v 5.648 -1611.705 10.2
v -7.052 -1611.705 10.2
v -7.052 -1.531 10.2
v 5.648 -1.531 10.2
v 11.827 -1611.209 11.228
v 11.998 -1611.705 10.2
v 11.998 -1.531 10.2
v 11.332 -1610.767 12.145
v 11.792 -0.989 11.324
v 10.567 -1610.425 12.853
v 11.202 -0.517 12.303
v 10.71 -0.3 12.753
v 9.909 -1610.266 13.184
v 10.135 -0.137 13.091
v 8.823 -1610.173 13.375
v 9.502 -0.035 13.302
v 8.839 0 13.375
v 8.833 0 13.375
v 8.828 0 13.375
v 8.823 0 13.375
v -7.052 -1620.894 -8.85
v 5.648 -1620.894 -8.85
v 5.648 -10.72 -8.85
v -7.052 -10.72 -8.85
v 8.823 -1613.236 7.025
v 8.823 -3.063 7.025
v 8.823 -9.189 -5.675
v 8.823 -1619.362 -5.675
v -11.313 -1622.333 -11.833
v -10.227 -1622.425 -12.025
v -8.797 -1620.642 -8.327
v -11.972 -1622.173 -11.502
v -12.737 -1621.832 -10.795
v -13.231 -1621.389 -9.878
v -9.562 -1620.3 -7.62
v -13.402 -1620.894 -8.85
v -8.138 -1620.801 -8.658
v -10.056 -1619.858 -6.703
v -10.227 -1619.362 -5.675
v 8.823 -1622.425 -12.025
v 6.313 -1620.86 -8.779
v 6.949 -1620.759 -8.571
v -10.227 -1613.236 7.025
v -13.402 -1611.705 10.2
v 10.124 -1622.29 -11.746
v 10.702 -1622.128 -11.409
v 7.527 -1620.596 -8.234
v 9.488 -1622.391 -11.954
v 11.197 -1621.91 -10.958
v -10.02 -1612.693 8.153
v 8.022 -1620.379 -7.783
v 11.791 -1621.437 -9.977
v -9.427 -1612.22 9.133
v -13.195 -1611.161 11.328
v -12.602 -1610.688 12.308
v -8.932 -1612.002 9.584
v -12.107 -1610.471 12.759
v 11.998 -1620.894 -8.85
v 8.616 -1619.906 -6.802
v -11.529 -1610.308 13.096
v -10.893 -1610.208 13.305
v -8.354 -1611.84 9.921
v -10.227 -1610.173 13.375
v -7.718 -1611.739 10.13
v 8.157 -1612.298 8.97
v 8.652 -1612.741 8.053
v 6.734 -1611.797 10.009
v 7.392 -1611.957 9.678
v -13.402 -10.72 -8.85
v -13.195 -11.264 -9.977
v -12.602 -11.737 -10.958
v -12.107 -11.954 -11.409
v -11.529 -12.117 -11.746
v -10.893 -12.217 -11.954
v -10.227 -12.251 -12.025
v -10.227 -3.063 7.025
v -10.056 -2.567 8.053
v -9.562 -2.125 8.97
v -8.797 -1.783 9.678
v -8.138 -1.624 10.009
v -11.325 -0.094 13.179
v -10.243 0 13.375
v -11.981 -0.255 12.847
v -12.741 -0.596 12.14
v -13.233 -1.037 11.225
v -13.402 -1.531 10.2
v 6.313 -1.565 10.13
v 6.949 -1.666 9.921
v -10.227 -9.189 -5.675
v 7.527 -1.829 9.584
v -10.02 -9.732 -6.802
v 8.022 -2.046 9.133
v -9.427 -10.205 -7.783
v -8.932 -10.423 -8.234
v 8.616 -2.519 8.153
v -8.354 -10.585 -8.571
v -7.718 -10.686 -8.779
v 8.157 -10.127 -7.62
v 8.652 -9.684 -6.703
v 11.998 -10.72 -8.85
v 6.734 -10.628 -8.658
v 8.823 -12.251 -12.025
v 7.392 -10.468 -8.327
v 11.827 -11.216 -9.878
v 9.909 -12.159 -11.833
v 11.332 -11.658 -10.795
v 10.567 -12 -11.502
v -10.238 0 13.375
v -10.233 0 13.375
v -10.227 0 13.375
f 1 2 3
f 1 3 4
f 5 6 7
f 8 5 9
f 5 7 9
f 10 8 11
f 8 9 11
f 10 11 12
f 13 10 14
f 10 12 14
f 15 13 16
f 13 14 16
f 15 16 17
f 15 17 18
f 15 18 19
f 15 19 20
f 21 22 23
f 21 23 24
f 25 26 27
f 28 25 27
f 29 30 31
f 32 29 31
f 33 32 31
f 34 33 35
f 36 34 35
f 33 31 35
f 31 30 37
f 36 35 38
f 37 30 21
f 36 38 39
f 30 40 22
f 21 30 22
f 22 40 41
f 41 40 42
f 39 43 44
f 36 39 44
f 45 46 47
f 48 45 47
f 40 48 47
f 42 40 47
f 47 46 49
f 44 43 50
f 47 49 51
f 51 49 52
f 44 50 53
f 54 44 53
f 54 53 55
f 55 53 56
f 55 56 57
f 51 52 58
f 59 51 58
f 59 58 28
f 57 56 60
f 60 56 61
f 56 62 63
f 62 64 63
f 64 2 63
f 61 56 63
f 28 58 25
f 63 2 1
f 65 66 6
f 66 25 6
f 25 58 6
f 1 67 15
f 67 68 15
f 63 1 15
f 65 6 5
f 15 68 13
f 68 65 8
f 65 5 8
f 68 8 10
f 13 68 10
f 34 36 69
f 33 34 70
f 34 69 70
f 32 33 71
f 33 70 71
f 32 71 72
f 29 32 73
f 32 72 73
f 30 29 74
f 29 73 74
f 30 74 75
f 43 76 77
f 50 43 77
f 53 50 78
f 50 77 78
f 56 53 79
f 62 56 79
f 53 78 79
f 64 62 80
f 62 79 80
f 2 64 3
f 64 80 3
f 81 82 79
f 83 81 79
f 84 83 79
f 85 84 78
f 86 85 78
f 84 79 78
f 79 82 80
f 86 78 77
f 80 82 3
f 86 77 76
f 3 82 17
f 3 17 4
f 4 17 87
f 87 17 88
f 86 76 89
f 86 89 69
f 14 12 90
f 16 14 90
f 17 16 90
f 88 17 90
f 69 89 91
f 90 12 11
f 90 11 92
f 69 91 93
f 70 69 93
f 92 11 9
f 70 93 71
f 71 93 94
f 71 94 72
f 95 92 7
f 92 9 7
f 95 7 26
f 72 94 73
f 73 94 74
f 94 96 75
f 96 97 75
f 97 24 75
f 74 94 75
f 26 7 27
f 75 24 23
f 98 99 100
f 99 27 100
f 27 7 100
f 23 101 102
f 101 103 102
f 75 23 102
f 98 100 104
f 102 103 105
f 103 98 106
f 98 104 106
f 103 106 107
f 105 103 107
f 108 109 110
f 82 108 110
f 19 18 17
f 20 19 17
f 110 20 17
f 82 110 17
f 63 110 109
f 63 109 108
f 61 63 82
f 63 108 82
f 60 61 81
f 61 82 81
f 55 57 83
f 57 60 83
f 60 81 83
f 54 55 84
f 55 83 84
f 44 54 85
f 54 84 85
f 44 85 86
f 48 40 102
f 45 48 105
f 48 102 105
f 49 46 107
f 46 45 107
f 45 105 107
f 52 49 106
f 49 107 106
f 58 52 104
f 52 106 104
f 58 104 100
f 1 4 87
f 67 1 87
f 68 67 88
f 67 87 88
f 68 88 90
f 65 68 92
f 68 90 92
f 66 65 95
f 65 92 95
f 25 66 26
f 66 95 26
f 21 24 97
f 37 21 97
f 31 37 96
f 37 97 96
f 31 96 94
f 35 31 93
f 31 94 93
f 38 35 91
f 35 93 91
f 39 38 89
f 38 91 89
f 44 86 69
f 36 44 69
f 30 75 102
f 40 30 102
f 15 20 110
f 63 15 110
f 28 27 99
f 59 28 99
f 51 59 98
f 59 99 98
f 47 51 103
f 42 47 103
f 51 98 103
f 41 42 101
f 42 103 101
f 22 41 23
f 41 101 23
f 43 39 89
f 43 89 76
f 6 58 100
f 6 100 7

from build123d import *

# Parameters (mm, degrees)
F1_DEPTH = 1622.425
F3_DEPTH = 38.1
F5_DEPTH = 25.4


with BuildPart() as f1:
    # F0 (on Front) → F1 (new body)
    with BuildSketch(Plane.XZ):
        with BuildLine():
            Line((-10.2273916114, -12.0247762322), (8.8226083886, -12.0247762322))
            ThreePointArc((8.8226083886, -12.0247762322), (11.0676724189, -11.0948402625), (11.9976083886, -8.8497762322))
            Line((11.9976083886, -8.8497762322), (11.9976083886, 10.2002237678))
            ThreePointArc((11.9976083886, 10.2002237678), (11.0676724189, 12.445287798), (8.8226083886, 13.3752237678))
            Line((8.8226083886, 13.3752237678), (-10.2273916114, 13.3752237678))
            ThreePointArc((-10.2273916114, 13.3752237678), (-12.4724556417, 12.445287798), (-13.4023916114, 10.2002237678))
            Line((-13.4023916114, 10.2002237678), (-13.4023916114, -8.8497762322))
            ThreePointArc((-13.4023916114, -8.8497762322), (-12.4724556417, -11.0948402625), (-10.2273916114, -12.0247762322))
        make_face()
        with BuildLine():
            ThreePointArc((8.8226083886, -5.6747762322), (7.8926724189, -7.9198402625), (5.6476083886, -8.8497762322))
            Line((5.6476083886, -8.8497762322), (-7.0523916114, -8.8497762322))
            ThreePointArc((-7.0523916114, -8.8497762322), (-9.2974556417, -7.9198402625), (-10.2273916114, -5.6747762322))
            Line((-10.2273916114, -5.6747762322), (-10.2273916114, 7.0252237678))
            ThreePointArc((-10.2273916114, 7.0252237678), (-9.2974556417, 9.270287798), (-7.0523916114, 10.2002237678))
            Line((-7.0523916114, 10.2002237678), (5.6476083886, 10.2002237678))
            ThreePointArc((5.6476083886, 10.2002237678), (7.8926724189, 9.270287798), (8.8226083886, 7.0252237678))
            Line((8.8226083886, 7.0252237678), (8.8226083886, -5.6747762322))
        make_face(mode=Mode.SUBTRACT)
    extrude(amount=F1_DEPTH)

    # F2 (on Right) → F3 (cut, symmetric)
    with BuildSketch(Plane.YZ):
        Polygon((0, -13.513528793), (0, 13.375182943), (-12.9695749158, -13.513528793), align=None)
    extrude(amount=F3_DEPTH, both=True, mode=Mode.SUBTRACT)

    # F4 (on Right) → F5 (cut, symmetric)
    with BuildSketch(Plane.YZ):
        Polygon((-1622.425, 14.8639355038), (-1622.425, -12.0247762322), (-1609.4554250842, 14.8639355038), align=None)
    extrude(amount=F5_DEPTH, both=True, mode=Mode.SUBTRACT)


solid = f1.part
